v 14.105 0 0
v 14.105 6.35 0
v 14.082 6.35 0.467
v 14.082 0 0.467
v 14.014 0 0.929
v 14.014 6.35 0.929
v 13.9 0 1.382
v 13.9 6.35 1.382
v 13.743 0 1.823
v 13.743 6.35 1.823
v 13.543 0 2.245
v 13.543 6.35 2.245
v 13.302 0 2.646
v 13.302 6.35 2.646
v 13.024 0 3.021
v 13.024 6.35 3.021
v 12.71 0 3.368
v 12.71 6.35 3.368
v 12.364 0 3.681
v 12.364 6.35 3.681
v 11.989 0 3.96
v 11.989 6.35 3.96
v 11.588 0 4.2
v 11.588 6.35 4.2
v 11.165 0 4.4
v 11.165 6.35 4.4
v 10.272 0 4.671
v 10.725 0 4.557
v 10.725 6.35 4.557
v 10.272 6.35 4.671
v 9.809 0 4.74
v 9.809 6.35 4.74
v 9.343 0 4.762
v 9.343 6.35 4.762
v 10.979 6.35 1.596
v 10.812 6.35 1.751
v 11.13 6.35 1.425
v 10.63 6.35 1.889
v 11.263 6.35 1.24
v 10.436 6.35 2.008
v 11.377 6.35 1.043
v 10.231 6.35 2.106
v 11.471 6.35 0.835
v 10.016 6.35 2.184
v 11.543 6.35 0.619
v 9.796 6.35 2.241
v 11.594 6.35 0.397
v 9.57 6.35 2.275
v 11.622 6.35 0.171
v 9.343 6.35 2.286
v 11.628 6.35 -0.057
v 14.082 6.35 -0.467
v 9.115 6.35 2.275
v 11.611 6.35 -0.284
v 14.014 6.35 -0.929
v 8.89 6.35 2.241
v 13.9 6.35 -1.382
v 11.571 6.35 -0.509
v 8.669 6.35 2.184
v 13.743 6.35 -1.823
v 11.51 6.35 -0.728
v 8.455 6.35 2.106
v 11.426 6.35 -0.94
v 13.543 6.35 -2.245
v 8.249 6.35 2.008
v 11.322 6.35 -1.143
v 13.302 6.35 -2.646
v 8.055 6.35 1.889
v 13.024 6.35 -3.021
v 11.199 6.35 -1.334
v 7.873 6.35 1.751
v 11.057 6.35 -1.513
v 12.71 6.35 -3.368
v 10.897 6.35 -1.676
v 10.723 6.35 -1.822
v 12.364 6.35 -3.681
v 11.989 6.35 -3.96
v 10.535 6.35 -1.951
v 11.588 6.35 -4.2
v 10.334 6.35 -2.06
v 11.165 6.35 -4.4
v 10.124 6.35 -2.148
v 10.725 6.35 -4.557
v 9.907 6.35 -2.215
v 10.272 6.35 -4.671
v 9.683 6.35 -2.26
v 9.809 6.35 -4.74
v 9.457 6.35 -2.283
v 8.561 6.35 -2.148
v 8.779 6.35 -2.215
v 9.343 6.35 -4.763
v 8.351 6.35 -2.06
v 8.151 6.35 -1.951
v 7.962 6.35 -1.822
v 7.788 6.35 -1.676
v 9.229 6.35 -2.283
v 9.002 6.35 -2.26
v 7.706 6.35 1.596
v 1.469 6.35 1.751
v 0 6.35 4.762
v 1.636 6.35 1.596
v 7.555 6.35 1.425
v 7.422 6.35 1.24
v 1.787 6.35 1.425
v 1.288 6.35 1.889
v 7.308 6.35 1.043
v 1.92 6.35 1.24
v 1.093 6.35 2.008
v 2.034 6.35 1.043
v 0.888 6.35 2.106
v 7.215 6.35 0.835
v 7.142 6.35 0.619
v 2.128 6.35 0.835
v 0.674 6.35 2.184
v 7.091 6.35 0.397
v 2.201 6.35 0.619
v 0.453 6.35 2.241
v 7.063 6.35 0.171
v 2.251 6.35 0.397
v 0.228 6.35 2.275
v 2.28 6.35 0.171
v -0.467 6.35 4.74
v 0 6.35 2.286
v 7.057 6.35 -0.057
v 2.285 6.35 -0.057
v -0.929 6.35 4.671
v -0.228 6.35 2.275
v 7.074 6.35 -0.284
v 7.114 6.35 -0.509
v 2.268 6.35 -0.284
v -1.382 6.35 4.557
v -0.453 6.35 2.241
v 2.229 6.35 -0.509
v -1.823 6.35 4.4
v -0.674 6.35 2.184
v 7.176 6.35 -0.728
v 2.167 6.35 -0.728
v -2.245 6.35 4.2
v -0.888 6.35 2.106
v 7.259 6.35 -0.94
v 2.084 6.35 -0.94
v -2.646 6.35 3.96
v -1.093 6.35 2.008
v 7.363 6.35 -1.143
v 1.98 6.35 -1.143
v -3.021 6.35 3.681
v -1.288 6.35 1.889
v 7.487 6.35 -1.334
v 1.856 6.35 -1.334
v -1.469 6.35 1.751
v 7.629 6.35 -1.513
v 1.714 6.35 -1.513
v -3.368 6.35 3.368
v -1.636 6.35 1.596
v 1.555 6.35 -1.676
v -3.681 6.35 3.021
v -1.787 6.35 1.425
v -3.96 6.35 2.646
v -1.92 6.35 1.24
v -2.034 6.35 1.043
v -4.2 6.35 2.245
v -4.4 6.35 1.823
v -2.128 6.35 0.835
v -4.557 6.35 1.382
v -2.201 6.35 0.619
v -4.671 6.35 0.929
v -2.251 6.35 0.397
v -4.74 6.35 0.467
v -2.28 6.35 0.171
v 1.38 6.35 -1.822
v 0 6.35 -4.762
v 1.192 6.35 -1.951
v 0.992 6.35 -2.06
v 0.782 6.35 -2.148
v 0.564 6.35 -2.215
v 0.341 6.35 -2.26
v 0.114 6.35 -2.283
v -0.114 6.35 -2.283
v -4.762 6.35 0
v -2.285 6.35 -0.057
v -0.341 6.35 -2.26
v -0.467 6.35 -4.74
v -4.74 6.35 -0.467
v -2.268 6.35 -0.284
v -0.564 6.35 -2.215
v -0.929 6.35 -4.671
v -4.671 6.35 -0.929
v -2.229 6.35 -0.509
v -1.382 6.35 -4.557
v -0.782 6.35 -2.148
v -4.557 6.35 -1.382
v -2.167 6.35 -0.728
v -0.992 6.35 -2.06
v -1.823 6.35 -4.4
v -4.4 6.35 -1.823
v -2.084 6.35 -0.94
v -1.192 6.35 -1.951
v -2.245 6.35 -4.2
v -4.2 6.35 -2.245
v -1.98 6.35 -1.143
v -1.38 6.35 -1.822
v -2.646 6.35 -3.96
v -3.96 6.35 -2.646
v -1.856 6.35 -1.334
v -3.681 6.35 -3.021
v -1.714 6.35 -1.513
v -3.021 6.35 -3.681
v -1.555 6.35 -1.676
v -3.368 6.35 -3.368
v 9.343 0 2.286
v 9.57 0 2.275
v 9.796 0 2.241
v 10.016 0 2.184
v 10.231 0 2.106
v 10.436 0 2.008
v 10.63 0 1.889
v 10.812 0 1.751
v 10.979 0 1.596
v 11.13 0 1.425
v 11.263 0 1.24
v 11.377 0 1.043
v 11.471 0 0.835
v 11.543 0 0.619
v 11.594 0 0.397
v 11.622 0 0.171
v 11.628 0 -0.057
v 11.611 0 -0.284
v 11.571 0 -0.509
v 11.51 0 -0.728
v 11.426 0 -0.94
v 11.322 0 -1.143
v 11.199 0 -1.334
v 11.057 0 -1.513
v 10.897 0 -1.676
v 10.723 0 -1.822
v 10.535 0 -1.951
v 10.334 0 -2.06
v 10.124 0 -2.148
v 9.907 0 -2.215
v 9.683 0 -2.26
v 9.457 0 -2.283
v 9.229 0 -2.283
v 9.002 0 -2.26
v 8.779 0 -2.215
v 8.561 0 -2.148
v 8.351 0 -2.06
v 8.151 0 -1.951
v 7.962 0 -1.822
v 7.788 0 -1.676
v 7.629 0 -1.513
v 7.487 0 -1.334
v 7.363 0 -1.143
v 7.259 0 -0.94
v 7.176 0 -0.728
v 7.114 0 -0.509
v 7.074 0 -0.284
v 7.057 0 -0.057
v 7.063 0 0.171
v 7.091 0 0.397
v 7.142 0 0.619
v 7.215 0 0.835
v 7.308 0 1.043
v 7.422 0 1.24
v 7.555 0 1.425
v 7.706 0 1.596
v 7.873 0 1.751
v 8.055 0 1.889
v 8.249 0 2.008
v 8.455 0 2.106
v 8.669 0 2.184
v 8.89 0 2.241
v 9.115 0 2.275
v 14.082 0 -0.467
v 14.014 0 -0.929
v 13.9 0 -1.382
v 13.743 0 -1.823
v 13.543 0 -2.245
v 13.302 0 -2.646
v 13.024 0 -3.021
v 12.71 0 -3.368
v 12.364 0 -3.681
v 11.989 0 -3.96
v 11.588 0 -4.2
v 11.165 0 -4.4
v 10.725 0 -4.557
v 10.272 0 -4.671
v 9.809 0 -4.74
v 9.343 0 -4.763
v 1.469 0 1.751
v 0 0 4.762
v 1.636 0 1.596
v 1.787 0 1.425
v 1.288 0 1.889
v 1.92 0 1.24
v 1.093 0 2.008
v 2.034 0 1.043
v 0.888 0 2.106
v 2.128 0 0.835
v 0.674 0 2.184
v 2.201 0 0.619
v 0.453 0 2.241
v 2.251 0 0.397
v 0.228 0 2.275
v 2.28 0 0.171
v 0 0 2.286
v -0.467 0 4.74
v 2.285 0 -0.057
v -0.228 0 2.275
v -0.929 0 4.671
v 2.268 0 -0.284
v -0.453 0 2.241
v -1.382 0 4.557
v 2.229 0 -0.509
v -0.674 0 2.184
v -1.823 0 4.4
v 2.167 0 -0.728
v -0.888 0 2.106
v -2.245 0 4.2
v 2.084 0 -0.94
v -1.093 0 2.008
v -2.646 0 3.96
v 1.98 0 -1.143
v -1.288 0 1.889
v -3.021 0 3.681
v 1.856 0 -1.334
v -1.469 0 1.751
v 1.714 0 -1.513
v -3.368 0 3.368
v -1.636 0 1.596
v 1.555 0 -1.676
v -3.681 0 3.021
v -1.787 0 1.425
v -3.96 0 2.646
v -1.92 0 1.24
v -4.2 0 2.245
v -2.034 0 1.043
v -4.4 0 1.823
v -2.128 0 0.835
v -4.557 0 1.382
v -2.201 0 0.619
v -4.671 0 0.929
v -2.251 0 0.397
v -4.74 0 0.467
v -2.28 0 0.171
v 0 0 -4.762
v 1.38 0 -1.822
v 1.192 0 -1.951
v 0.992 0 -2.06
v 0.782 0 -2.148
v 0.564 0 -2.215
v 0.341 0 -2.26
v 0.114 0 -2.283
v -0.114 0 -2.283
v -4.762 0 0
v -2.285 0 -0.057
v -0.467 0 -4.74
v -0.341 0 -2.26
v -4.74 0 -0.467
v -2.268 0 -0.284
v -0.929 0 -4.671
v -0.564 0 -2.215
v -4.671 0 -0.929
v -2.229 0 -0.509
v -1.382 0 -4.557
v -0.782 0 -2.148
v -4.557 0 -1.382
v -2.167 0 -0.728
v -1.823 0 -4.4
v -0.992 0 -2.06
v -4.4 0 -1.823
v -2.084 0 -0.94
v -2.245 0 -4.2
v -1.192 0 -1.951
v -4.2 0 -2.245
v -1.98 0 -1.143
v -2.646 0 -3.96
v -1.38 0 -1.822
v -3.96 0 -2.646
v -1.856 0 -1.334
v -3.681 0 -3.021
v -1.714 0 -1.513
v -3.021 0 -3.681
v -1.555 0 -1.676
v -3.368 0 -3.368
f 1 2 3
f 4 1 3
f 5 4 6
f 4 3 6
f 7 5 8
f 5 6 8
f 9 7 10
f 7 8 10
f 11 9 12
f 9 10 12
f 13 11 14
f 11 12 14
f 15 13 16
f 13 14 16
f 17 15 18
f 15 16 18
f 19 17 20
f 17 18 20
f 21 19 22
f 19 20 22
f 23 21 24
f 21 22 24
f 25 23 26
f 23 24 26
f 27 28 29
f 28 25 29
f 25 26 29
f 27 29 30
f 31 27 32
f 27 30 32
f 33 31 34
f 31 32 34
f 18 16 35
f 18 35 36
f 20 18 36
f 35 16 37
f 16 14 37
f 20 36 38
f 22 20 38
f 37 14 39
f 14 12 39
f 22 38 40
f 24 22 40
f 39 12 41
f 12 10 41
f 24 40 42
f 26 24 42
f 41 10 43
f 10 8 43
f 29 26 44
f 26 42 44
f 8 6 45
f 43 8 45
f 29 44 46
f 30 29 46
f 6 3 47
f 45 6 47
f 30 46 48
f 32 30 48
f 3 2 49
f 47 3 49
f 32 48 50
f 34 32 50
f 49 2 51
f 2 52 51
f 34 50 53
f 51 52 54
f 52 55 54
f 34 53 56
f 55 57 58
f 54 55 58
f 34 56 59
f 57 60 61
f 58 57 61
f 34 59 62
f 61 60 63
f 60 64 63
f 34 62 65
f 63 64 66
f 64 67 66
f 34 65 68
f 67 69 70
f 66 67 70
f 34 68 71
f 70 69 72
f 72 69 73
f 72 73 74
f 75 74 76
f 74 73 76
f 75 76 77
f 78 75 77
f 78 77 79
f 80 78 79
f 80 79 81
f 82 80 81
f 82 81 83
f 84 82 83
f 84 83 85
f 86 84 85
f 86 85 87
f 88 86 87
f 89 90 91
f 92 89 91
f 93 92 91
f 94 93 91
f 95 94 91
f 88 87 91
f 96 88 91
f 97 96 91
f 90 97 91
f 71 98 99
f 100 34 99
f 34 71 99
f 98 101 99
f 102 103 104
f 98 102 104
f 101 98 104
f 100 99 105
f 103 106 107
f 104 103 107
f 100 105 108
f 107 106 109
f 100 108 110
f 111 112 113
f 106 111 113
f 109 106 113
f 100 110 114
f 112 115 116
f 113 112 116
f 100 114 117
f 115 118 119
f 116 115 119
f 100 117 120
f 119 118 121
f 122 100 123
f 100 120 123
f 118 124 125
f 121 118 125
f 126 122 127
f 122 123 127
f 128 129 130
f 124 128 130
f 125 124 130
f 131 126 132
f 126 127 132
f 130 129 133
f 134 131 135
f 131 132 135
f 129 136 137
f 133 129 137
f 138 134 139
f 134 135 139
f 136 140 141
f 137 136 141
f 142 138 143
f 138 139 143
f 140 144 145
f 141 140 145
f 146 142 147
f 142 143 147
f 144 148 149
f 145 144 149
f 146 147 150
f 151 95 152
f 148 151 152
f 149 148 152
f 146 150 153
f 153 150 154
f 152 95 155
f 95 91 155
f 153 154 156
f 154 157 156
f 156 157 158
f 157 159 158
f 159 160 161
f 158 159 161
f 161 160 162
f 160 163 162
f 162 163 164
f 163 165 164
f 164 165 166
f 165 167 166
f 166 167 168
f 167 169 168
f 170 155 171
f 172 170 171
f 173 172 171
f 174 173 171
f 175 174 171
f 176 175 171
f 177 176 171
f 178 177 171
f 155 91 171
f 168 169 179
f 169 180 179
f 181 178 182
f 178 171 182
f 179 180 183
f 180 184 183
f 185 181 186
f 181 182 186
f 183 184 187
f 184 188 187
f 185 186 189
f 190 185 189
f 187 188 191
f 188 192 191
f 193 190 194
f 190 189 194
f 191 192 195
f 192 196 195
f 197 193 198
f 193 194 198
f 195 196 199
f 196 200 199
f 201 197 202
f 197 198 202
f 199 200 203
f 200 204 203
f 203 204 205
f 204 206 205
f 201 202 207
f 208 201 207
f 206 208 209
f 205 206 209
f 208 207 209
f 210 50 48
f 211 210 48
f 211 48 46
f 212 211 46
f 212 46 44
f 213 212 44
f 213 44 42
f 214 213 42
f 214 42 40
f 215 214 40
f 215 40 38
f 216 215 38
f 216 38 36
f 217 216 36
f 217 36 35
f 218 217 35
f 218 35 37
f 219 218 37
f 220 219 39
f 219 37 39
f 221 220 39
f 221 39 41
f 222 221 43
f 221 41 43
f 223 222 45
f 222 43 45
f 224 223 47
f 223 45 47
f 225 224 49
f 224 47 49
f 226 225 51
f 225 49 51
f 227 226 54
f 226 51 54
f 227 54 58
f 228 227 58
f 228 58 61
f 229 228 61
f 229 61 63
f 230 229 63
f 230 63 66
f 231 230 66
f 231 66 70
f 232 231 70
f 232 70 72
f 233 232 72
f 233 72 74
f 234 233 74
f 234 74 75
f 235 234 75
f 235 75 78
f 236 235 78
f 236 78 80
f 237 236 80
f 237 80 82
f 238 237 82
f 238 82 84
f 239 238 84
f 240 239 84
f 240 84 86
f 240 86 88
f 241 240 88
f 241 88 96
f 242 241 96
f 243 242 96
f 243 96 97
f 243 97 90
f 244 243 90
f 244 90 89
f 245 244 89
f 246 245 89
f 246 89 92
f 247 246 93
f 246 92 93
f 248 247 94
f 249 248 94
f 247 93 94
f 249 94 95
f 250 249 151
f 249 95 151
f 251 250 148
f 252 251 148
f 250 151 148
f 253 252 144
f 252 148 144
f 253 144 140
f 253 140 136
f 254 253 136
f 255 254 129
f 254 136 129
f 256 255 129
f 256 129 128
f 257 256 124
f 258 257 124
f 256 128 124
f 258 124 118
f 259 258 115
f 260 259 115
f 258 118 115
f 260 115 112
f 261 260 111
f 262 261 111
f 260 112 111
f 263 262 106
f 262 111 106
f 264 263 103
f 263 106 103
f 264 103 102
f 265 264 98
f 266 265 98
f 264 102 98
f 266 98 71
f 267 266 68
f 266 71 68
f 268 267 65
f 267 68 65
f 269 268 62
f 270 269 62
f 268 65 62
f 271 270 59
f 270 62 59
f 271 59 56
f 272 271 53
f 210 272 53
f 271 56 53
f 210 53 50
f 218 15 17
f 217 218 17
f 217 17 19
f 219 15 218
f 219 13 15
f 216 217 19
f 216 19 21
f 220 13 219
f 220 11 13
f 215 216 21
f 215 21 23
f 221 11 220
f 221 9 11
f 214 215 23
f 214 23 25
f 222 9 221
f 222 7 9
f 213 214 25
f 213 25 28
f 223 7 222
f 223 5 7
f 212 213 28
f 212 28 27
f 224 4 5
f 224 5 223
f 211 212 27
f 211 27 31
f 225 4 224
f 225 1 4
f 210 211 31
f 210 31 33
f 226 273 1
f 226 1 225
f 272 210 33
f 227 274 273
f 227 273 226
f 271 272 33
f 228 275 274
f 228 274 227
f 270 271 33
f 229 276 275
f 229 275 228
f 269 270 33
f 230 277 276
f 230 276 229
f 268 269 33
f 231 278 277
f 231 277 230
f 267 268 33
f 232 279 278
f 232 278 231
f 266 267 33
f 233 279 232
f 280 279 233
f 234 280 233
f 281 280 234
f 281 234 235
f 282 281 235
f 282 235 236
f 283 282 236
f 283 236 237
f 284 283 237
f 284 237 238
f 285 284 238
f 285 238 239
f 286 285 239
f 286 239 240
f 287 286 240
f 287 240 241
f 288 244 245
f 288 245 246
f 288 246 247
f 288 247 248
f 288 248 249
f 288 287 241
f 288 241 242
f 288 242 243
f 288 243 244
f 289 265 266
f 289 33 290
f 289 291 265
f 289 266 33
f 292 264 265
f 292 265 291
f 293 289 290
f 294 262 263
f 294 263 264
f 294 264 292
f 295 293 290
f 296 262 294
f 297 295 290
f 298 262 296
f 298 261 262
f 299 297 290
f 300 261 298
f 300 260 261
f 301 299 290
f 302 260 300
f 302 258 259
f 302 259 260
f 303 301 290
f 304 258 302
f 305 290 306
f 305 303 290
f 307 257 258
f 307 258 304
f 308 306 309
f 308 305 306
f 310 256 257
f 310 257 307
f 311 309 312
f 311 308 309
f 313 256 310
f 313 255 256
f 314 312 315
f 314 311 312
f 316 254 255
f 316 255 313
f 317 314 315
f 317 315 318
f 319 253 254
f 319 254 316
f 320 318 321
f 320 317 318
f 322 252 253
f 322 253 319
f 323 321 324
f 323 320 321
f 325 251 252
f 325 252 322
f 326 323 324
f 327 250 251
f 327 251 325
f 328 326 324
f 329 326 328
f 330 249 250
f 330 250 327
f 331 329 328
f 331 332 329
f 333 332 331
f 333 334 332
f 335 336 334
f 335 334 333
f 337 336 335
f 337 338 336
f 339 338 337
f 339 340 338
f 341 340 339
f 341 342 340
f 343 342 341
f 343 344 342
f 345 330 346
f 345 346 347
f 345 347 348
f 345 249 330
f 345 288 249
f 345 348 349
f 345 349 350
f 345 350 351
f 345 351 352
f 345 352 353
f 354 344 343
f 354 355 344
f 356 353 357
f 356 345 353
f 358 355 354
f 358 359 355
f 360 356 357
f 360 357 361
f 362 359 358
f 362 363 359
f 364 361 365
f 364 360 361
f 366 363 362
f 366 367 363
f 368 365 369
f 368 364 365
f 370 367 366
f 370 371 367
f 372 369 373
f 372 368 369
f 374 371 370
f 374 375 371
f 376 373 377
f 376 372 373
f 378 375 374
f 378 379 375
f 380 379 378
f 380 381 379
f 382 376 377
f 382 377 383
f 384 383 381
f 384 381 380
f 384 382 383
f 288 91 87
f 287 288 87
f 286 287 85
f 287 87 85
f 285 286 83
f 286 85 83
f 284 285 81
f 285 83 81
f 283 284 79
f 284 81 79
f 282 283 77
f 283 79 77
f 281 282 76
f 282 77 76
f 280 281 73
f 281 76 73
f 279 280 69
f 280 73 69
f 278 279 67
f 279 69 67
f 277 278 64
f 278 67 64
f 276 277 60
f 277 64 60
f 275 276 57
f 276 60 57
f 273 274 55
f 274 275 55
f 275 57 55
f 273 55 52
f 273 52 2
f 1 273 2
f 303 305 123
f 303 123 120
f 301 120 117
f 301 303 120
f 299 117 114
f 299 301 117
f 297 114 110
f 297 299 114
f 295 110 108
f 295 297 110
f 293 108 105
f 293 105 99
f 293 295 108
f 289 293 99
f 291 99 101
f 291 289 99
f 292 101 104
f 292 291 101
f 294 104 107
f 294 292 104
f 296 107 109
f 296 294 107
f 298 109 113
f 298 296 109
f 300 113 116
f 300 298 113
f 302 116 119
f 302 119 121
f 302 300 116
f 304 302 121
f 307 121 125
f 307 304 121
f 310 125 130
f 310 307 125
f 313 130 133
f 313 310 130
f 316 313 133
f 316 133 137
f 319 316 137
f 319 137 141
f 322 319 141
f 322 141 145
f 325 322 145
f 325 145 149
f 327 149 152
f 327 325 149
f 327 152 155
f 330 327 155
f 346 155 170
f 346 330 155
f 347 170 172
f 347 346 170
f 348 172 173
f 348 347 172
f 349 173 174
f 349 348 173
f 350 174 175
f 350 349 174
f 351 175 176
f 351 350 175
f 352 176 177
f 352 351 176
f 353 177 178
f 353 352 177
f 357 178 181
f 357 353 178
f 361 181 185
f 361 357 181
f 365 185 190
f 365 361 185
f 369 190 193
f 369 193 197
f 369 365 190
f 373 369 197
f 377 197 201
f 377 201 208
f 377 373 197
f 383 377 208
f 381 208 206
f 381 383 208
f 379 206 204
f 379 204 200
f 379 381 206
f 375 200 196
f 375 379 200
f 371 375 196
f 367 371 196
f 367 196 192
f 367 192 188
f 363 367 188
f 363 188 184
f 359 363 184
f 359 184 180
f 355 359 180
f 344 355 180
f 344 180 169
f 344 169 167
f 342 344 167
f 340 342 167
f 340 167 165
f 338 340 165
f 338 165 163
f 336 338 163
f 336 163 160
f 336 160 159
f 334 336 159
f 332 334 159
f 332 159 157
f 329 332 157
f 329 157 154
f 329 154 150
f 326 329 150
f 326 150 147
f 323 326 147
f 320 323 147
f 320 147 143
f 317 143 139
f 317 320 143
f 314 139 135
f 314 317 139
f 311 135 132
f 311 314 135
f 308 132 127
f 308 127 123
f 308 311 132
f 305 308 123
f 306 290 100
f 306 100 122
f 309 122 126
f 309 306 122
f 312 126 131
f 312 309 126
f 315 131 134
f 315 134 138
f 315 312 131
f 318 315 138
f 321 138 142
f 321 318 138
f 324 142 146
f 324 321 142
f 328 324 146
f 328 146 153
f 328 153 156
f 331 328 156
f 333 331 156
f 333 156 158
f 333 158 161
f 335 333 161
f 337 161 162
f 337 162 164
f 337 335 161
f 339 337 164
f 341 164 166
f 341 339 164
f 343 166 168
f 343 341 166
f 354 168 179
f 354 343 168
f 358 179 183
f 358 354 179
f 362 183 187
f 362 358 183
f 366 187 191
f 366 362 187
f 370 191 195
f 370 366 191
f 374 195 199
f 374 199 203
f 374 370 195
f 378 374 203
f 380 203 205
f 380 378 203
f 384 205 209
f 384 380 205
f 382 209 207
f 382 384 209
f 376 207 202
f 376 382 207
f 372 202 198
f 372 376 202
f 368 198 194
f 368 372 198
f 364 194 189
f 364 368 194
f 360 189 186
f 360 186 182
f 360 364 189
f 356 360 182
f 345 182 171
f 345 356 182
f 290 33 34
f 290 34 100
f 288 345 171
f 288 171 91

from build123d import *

# Parameters (mm, degrees)
SKETCH2_R           = 2.286
BOSS_EXTRUDE1_DEPTH = 6.35
SKETCH4_R           = 2.286
CUT_EXTRUDE2_DEPTH  = 17.185114529


with BuildPart() as part:
    # Sketch2 → Boss-Extrude1 (new body)
    with BuildSketch(Plane(origin=(0, 0, 0), x_dir=(1, 0, 0), z_dir=(0, 1, 0))):
        with BuildLine():
            Line((0, 4.7625), (14.105106383, 4.7625))
            Line((14.105106383, 4.7625), (14.105106383, -4.7625))
            Line((14.105106383, -4.7625), (0, -4.7625))
            ThreePointArc((0, -4.7625), (-4.7625, 0), (0, 4.7625))
        make_face()
        with Locations(Location((0, 0, 0), (0, 0, 270))):
            Circle(SKETCH2_R, mode=Mode.SUBTRACT)
    extrude(amount=BOSS_EXTRUDE1_DEPTH)

    # Sketch4 → Cut-Extrude2 (cut, through all)
    with BuildSketch(Plane(origin=(0, 6.35, 0), x_dir=(1, 0, 0), z_dir=(0, 1, 0))):
        with BuildLine():
            Line((14.105106383, 4.7625), (9.342606383, 4.7625))
            ThreePointArc((9.342606383, 4.7625), (12.710202422, 3.367596052), (14.105106383, 1.8e-08))
            Line((14.105106383, 1.8e-08), (14.105106383, 4.7625))
        make_face()
        with BuildLine():
            Line((14.105106383, -4.7625), (14.105106383, 1.8e-08))
            ThreePointArc((14.105106383, 1.8e-08), (12.710202435, -3.367596039), (9.342606383, -4.7625))
            Line((9.342606383, -4.7625), (14.105106383, -4.7625))
        make_face()
        with Locations(Location((9.342606383, 0, 0), (0, 0, 270))):
            Circle(SKETCH4_R)
    extrude(amount=-CUT_EXTRUDE2_DEPTH, mode=Mode.SUBTRACT)


solid = part.part
